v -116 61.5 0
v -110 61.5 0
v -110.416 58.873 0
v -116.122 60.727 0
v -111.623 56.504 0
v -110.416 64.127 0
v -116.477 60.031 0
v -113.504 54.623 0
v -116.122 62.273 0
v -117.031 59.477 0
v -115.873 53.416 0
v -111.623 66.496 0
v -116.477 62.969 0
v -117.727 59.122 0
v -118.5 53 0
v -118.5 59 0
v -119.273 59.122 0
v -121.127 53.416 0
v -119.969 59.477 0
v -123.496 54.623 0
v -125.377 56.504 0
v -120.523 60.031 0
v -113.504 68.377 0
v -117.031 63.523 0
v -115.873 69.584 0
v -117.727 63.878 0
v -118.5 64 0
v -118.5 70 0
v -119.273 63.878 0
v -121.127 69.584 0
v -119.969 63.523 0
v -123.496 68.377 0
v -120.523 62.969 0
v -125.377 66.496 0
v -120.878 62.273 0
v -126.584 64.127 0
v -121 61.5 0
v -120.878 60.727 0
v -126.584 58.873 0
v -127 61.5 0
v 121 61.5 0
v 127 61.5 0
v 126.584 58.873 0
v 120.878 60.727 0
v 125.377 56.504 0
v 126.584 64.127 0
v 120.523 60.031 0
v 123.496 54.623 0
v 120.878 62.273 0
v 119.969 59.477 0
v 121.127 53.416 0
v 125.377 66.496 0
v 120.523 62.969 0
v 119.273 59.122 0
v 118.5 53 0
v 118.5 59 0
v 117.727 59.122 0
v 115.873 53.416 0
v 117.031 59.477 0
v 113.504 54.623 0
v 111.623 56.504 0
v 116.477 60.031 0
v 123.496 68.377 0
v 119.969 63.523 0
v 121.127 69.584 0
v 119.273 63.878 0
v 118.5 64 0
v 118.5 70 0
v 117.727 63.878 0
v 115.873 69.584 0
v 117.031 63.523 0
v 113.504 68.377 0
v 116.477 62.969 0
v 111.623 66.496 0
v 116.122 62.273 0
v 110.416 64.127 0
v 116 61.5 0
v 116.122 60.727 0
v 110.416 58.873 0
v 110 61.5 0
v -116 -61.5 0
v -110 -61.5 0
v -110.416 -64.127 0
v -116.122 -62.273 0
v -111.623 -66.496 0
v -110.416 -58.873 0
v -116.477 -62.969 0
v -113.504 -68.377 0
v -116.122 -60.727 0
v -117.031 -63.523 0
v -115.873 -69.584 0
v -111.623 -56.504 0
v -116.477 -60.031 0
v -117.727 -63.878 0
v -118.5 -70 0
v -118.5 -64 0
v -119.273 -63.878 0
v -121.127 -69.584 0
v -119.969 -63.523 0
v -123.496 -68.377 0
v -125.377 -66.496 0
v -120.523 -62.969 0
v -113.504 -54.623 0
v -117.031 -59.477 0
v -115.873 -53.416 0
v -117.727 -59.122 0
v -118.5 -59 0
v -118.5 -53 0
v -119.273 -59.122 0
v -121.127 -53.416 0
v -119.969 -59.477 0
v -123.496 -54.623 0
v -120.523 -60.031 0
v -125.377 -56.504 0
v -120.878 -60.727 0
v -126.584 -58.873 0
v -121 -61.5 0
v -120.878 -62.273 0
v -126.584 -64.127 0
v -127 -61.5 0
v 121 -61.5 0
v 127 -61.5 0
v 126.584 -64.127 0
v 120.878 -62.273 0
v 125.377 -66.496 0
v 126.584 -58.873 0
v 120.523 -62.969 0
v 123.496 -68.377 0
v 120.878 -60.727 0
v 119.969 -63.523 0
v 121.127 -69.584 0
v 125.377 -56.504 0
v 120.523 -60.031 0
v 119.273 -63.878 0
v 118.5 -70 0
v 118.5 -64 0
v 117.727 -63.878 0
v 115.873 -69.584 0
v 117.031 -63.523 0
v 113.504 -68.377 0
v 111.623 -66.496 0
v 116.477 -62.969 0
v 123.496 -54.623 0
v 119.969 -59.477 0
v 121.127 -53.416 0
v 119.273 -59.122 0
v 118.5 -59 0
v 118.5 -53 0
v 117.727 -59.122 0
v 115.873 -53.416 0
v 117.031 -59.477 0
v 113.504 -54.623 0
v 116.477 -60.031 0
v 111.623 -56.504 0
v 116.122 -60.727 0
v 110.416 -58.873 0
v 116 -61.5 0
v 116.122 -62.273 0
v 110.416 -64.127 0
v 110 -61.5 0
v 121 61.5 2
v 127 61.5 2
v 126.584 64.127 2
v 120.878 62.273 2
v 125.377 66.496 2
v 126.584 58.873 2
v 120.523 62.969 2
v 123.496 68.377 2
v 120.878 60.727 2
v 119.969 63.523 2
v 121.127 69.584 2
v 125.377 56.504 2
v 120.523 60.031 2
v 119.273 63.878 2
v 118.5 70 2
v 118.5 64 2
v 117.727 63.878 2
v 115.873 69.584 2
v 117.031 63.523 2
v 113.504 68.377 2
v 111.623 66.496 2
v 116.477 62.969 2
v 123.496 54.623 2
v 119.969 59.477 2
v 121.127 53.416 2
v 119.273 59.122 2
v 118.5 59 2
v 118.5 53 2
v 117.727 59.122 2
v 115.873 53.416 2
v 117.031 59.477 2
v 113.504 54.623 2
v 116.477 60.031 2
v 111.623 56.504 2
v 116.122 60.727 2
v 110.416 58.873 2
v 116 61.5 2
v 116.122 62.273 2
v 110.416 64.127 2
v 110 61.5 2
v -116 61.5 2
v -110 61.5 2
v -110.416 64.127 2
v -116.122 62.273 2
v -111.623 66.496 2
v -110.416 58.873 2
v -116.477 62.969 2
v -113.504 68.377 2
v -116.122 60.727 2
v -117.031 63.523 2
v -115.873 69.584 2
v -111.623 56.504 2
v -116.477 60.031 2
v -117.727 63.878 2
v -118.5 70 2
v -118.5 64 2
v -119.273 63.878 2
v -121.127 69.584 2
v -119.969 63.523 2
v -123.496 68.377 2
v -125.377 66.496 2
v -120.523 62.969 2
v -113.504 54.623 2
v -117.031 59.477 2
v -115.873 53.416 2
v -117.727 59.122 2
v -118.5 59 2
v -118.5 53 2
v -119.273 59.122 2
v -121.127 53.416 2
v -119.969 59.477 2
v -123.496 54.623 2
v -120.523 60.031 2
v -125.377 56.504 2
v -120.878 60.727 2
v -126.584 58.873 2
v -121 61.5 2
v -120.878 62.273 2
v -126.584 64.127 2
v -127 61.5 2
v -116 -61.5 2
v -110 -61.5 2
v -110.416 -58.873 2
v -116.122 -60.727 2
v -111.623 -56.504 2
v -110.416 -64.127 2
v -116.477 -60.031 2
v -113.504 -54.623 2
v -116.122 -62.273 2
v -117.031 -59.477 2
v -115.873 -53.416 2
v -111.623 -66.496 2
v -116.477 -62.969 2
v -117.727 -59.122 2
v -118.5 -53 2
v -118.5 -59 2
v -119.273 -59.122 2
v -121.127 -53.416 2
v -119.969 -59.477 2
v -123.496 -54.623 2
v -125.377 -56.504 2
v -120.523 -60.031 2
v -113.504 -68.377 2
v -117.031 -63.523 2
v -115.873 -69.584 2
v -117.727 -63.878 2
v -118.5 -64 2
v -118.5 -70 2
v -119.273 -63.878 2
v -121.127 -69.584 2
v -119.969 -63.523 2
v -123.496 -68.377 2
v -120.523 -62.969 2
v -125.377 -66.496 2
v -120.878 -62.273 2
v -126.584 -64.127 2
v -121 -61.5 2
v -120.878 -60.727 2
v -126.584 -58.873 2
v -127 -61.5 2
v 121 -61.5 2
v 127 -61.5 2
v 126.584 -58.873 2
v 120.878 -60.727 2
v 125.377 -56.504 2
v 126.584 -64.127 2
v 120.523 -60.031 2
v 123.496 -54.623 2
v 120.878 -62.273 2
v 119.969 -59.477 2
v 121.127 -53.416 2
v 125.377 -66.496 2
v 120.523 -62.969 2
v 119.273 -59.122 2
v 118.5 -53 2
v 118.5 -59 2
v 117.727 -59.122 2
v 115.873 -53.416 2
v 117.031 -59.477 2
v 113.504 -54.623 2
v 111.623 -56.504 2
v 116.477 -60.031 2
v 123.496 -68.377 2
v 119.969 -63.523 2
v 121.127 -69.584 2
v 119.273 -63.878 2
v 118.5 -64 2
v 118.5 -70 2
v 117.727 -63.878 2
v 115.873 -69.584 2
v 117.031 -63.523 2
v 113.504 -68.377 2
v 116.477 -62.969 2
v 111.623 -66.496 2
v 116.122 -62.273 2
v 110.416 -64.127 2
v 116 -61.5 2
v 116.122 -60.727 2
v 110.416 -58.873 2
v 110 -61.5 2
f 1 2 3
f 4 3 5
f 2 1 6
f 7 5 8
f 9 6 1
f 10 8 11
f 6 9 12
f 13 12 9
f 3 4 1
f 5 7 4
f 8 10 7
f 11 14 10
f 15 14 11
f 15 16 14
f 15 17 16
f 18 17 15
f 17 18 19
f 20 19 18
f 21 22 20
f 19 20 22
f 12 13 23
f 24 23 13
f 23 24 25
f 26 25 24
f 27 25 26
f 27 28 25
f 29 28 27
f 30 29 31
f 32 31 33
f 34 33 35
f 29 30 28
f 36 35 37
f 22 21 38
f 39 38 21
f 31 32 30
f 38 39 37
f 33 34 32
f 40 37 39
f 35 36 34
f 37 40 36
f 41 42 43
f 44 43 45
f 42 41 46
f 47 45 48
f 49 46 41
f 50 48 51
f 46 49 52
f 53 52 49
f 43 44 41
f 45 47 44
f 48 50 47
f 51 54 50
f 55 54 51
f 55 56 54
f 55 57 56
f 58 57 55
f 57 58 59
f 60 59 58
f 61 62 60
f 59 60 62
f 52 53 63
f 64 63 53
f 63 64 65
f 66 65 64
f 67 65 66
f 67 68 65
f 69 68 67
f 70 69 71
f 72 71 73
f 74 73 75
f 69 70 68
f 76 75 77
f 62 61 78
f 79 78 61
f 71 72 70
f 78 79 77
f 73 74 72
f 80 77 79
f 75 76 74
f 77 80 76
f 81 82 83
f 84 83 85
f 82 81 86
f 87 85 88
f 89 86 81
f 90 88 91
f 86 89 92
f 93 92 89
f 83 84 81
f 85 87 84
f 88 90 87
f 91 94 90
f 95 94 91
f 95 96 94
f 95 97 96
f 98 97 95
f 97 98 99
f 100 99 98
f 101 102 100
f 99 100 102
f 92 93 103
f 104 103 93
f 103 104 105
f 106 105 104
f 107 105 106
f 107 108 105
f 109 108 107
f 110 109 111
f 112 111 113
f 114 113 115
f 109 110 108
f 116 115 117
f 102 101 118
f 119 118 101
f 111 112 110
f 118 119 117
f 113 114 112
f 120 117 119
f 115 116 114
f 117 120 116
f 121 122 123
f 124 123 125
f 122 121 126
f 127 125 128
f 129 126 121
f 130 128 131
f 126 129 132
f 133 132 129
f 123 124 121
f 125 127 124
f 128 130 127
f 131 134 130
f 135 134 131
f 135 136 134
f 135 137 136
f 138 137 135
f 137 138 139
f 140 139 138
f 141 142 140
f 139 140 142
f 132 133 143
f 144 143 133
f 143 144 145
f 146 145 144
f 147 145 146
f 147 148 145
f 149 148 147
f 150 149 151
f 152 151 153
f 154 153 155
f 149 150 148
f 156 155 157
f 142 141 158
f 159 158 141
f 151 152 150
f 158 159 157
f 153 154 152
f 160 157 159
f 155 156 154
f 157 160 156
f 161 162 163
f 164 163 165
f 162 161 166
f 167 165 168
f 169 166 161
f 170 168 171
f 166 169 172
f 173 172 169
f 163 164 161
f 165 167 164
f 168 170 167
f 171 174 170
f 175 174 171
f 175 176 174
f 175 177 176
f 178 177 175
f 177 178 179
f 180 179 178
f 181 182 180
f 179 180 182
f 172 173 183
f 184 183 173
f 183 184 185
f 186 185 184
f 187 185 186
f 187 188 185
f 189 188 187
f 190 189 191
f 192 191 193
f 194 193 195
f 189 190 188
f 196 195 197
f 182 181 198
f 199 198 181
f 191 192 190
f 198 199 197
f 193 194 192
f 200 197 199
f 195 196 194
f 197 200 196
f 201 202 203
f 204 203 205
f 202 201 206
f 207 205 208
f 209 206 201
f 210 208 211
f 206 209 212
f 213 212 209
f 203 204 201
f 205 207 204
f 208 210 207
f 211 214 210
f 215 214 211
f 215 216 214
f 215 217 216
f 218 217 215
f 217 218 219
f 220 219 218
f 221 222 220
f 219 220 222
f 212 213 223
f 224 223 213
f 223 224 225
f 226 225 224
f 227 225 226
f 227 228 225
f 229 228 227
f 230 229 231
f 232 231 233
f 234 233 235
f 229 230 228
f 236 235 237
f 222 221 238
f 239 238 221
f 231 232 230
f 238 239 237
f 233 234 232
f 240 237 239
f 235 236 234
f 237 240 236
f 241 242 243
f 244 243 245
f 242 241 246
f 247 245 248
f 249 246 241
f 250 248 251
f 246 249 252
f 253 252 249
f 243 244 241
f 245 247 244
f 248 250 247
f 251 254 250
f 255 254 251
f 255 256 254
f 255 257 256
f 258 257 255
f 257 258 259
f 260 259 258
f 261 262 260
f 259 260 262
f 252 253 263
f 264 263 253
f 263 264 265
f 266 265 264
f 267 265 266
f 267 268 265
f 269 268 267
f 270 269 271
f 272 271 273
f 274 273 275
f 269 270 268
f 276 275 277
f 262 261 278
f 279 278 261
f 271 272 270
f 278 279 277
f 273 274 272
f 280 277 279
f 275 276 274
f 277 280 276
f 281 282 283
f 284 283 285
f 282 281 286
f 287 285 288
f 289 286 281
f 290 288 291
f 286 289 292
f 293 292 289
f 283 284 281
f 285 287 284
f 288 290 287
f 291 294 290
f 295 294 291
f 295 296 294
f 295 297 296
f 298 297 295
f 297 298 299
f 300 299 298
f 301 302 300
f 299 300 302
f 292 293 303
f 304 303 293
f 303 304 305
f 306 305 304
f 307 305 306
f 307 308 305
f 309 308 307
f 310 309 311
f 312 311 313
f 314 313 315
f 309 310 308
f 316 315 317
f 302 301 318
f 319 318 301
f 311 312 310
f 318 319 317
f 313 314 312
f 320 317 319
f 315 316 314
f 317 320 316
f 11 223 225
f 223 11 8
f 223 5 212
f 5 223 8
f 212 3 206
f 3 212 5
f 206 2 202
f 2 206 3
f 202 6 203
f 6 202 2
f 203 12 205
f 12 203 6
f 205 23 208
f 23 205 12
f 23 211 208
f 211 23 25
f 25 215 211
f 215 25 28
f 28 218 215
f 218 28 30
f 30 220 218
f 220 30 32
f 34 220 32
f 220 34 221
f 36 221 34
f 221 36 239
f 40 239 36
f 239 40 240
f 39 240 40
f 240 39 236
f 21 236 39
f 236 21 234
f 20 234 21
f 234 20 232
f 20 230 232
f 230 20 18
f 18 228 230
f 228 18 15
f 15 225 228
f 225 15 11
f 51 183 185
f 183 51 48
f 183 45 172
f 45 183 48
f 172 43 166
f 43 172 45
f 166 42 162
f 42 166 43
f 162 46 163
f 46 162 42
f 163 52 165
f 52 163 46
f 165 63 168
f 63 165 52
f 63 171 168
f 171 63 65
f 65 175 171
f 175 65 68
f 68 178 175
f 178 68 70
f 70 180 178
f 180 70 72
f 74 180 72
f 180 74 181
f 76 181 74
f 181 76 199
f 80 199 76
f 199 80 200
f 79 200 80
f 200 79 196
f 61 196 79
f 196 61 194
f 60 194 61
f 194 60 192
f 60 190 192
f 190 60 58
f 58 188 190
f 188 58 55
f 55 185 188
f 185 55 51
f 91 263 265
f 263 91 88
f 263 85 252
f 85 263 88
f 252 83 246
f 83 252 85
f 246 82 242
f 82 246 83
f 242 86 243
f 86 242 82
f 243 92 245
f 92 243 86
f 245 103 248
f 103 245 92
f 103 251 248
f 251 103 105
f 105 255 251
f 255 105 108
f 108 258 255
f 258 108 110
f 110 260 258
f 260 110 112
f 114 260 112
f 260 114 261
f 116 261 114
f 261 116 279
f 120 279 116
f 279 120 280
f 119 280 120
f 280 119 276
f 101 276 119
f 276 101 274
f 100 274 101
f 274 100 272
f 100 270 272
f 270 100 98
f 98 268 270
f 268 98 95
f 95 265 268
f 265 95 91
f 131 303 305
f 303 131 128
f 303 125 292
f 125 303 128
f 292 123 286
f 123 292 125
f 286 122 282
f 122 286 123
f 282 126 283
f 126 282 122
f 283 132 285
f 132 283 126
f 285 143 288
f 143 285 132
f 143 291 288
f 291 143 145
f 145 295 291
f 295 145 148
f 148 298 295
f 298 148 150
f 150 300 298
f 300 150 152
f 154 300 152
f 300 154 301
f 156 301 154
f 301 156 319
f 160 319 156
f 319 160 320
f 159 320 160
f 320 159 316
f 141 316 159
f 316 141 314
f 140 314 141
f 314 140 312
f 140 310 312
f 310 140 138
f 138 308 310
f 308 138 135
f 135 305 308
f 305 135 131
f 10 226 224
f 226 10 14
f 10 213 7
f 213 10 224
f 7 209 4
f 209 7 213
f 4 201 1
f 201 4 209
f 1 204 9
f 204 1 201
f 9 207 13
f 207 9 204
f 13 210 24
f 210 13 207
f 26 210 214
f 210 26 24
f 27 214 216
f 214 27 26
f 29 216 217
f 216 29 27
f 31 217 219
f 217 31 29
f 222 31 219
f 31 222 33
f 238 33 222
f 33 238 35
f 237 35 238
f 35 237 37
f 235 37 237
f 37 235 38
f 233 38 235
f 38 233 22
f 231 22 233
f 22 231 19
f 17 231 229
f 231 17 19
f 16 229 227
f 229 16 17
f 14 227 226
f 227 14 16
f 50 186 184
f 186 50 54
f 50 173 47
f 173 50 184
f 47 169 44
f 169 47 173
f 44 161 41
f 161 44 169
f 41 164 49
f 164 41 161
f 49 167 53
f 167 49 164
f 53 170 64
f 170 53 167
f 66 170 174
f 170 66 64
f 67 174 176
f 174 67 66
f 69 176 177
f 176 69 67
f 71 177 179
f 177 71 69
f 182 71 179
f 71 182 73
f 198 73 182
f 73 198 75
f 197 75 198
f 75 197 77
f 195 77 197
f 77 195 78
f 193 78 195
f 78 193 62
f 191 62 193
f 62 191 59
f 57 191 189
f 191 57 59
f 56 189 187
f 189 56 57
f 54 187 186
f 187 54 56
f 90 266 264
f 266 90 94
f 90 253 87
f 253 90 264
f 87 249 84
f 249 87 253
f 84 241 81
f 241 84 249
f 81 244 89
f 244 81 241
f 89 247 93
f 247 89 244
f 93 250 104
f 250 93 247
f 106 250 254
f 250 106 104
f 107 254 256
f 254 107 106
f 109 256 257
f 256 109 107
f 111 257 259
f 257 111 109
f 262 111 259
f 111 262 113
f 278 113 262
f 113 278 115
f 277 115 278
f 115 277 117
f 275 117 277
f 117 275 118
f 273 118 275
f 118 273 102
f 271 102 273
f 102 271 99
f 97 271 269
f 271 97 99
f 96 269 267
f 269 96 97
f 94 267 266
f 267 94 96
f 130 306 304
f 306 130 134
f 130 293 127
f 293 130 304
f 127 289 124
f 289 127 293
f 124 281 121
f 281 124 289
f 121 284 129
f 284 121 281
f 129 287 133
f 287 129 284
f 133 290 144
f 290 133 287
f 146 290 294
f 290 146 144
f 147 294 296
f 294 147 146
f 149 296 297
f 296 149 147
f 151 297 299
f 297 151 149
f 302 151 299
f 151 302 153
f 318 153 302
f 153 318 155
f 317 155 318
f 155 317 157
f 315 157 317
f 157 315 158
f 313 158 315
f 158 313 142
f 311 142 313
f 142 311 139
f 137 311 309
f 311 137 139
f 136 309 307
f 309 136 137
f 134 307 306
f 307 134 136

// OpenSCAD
// file: slimbox_dimensions.scad
/*
This file contains all dimensions for the final prints.
*/

$fn = 20;


dim_box_width = 256;
dim_box_height = 160;
dim_box_depth = 26;
dim_box_bot_depth = 16;
dim_face_thickness = 4;
dim_wall_thickness = 6;
dim_base_thickness = 3;
dim_cord_cutout_diameter = 6;
dim_screw_diameter = 2.5;
// file: parts/screw_cutouts.scad
/*
This is a generic screw cutout for the fight stick.
*/

// Screws
module screw(
    screw_diameter
    ) {
    screw_diameter = max(1, screw_diameter);
    circle(screw_diameter, true);
}

/// Creates screws/screw holders for a fight stick.
module screws(is_holder = false, corner_length = 10, box_width = 220, box_height = 140, screw_diameter=5, holder_thickness=6, screw_height=200) {
    module corner() {
        diameter = is_holder ? screw_diameter + holder_thickness : screw_diameter;
        x_offset =  screw_diameter + holder_thickness;
        y_offset =  screw_diameter + holder_thickness;
        translate([x_offset, y_offset,0])
        screw(diameter);
    }

    module edge() {   
        // Corner 1
        mirror([1,0,0])
        translate([box_width / 2, 0,0])
        corner();

        // Connector
        connector_width = box_width - 1 * corner_length;

        // Corner 2
        translate([box_width / 2, 0,0])
        corner();

    }

    linear_extrude(height=screw_height)
    {
        // Bottom side
        translate([0, -box_height / 2, 0])
        edge();

        // Top side
        mirror([0,1,0])
        translate([0, -box_height / 2, 0])
        edge();
    }
}
// file: parts/base.scad
/// Creates a base for a fight stick.
/// `corner_length` is the size of the corners
/// `box_width` is the width of the box
/// `box_height` is the height of the box
module base(corner_length = 10, box_width = 220, box_height = 140) {
    module corner() {
        points = [
            [0,0],
            [0,corner_length],
            [corner_length,corner_length],
        ];

        translate([-corner_length / 2, -corner_length / 2,0])
        polygon(points);
    }

    module edge() {   
        // Corner 1
        mirror([1,0,0])
        translate([box_width / 2, 0,0])
        corner();

        // Connector
        connector_width = box_width - 1 * corner_length;

        translate([-connector_width / 2, -corner_length / 2,0])
        polygon([
        [0,0],
        [connector_width,0],
        [connector_width, corner_length],
        [0, corner_length]
        ]);


        // Corner 2
        translate([box_width / 2, 0,0])
        corner();

    }

    module fill() {
        fill_width = box_width + corner_length;
        fill_height = box_height - corner_length;

        translate([-fill_width / 2, -fill_height / 2,0])
        polygon([
            [0,0],
            [fill_width,0],
            [fill_width, fill_height],
            [0, fill_height]
        ]);
    }

    // Bottom side
    translate([0, -box_height / 2,0])
    edge();

    // Top side
    mirror([0,1,0])
    translate([0, -box_height / 2,0])
    edge();

    // Fill it all
    fill();
}
// main file
/*
This file is the bottom of the fight stick.
*/

include <parts/base.scad>;
include <parts/screw_cutouts.scad>;
include <slimbox_dimensions.scad>;

difference() {
    height = 2;
screws(is_holder=true,screw_height=height, screw_diameter=dim_screw_diameter);
screws(is_holder=false,screw_height=height, screw_diameter=dim_screw_diameter);
}
